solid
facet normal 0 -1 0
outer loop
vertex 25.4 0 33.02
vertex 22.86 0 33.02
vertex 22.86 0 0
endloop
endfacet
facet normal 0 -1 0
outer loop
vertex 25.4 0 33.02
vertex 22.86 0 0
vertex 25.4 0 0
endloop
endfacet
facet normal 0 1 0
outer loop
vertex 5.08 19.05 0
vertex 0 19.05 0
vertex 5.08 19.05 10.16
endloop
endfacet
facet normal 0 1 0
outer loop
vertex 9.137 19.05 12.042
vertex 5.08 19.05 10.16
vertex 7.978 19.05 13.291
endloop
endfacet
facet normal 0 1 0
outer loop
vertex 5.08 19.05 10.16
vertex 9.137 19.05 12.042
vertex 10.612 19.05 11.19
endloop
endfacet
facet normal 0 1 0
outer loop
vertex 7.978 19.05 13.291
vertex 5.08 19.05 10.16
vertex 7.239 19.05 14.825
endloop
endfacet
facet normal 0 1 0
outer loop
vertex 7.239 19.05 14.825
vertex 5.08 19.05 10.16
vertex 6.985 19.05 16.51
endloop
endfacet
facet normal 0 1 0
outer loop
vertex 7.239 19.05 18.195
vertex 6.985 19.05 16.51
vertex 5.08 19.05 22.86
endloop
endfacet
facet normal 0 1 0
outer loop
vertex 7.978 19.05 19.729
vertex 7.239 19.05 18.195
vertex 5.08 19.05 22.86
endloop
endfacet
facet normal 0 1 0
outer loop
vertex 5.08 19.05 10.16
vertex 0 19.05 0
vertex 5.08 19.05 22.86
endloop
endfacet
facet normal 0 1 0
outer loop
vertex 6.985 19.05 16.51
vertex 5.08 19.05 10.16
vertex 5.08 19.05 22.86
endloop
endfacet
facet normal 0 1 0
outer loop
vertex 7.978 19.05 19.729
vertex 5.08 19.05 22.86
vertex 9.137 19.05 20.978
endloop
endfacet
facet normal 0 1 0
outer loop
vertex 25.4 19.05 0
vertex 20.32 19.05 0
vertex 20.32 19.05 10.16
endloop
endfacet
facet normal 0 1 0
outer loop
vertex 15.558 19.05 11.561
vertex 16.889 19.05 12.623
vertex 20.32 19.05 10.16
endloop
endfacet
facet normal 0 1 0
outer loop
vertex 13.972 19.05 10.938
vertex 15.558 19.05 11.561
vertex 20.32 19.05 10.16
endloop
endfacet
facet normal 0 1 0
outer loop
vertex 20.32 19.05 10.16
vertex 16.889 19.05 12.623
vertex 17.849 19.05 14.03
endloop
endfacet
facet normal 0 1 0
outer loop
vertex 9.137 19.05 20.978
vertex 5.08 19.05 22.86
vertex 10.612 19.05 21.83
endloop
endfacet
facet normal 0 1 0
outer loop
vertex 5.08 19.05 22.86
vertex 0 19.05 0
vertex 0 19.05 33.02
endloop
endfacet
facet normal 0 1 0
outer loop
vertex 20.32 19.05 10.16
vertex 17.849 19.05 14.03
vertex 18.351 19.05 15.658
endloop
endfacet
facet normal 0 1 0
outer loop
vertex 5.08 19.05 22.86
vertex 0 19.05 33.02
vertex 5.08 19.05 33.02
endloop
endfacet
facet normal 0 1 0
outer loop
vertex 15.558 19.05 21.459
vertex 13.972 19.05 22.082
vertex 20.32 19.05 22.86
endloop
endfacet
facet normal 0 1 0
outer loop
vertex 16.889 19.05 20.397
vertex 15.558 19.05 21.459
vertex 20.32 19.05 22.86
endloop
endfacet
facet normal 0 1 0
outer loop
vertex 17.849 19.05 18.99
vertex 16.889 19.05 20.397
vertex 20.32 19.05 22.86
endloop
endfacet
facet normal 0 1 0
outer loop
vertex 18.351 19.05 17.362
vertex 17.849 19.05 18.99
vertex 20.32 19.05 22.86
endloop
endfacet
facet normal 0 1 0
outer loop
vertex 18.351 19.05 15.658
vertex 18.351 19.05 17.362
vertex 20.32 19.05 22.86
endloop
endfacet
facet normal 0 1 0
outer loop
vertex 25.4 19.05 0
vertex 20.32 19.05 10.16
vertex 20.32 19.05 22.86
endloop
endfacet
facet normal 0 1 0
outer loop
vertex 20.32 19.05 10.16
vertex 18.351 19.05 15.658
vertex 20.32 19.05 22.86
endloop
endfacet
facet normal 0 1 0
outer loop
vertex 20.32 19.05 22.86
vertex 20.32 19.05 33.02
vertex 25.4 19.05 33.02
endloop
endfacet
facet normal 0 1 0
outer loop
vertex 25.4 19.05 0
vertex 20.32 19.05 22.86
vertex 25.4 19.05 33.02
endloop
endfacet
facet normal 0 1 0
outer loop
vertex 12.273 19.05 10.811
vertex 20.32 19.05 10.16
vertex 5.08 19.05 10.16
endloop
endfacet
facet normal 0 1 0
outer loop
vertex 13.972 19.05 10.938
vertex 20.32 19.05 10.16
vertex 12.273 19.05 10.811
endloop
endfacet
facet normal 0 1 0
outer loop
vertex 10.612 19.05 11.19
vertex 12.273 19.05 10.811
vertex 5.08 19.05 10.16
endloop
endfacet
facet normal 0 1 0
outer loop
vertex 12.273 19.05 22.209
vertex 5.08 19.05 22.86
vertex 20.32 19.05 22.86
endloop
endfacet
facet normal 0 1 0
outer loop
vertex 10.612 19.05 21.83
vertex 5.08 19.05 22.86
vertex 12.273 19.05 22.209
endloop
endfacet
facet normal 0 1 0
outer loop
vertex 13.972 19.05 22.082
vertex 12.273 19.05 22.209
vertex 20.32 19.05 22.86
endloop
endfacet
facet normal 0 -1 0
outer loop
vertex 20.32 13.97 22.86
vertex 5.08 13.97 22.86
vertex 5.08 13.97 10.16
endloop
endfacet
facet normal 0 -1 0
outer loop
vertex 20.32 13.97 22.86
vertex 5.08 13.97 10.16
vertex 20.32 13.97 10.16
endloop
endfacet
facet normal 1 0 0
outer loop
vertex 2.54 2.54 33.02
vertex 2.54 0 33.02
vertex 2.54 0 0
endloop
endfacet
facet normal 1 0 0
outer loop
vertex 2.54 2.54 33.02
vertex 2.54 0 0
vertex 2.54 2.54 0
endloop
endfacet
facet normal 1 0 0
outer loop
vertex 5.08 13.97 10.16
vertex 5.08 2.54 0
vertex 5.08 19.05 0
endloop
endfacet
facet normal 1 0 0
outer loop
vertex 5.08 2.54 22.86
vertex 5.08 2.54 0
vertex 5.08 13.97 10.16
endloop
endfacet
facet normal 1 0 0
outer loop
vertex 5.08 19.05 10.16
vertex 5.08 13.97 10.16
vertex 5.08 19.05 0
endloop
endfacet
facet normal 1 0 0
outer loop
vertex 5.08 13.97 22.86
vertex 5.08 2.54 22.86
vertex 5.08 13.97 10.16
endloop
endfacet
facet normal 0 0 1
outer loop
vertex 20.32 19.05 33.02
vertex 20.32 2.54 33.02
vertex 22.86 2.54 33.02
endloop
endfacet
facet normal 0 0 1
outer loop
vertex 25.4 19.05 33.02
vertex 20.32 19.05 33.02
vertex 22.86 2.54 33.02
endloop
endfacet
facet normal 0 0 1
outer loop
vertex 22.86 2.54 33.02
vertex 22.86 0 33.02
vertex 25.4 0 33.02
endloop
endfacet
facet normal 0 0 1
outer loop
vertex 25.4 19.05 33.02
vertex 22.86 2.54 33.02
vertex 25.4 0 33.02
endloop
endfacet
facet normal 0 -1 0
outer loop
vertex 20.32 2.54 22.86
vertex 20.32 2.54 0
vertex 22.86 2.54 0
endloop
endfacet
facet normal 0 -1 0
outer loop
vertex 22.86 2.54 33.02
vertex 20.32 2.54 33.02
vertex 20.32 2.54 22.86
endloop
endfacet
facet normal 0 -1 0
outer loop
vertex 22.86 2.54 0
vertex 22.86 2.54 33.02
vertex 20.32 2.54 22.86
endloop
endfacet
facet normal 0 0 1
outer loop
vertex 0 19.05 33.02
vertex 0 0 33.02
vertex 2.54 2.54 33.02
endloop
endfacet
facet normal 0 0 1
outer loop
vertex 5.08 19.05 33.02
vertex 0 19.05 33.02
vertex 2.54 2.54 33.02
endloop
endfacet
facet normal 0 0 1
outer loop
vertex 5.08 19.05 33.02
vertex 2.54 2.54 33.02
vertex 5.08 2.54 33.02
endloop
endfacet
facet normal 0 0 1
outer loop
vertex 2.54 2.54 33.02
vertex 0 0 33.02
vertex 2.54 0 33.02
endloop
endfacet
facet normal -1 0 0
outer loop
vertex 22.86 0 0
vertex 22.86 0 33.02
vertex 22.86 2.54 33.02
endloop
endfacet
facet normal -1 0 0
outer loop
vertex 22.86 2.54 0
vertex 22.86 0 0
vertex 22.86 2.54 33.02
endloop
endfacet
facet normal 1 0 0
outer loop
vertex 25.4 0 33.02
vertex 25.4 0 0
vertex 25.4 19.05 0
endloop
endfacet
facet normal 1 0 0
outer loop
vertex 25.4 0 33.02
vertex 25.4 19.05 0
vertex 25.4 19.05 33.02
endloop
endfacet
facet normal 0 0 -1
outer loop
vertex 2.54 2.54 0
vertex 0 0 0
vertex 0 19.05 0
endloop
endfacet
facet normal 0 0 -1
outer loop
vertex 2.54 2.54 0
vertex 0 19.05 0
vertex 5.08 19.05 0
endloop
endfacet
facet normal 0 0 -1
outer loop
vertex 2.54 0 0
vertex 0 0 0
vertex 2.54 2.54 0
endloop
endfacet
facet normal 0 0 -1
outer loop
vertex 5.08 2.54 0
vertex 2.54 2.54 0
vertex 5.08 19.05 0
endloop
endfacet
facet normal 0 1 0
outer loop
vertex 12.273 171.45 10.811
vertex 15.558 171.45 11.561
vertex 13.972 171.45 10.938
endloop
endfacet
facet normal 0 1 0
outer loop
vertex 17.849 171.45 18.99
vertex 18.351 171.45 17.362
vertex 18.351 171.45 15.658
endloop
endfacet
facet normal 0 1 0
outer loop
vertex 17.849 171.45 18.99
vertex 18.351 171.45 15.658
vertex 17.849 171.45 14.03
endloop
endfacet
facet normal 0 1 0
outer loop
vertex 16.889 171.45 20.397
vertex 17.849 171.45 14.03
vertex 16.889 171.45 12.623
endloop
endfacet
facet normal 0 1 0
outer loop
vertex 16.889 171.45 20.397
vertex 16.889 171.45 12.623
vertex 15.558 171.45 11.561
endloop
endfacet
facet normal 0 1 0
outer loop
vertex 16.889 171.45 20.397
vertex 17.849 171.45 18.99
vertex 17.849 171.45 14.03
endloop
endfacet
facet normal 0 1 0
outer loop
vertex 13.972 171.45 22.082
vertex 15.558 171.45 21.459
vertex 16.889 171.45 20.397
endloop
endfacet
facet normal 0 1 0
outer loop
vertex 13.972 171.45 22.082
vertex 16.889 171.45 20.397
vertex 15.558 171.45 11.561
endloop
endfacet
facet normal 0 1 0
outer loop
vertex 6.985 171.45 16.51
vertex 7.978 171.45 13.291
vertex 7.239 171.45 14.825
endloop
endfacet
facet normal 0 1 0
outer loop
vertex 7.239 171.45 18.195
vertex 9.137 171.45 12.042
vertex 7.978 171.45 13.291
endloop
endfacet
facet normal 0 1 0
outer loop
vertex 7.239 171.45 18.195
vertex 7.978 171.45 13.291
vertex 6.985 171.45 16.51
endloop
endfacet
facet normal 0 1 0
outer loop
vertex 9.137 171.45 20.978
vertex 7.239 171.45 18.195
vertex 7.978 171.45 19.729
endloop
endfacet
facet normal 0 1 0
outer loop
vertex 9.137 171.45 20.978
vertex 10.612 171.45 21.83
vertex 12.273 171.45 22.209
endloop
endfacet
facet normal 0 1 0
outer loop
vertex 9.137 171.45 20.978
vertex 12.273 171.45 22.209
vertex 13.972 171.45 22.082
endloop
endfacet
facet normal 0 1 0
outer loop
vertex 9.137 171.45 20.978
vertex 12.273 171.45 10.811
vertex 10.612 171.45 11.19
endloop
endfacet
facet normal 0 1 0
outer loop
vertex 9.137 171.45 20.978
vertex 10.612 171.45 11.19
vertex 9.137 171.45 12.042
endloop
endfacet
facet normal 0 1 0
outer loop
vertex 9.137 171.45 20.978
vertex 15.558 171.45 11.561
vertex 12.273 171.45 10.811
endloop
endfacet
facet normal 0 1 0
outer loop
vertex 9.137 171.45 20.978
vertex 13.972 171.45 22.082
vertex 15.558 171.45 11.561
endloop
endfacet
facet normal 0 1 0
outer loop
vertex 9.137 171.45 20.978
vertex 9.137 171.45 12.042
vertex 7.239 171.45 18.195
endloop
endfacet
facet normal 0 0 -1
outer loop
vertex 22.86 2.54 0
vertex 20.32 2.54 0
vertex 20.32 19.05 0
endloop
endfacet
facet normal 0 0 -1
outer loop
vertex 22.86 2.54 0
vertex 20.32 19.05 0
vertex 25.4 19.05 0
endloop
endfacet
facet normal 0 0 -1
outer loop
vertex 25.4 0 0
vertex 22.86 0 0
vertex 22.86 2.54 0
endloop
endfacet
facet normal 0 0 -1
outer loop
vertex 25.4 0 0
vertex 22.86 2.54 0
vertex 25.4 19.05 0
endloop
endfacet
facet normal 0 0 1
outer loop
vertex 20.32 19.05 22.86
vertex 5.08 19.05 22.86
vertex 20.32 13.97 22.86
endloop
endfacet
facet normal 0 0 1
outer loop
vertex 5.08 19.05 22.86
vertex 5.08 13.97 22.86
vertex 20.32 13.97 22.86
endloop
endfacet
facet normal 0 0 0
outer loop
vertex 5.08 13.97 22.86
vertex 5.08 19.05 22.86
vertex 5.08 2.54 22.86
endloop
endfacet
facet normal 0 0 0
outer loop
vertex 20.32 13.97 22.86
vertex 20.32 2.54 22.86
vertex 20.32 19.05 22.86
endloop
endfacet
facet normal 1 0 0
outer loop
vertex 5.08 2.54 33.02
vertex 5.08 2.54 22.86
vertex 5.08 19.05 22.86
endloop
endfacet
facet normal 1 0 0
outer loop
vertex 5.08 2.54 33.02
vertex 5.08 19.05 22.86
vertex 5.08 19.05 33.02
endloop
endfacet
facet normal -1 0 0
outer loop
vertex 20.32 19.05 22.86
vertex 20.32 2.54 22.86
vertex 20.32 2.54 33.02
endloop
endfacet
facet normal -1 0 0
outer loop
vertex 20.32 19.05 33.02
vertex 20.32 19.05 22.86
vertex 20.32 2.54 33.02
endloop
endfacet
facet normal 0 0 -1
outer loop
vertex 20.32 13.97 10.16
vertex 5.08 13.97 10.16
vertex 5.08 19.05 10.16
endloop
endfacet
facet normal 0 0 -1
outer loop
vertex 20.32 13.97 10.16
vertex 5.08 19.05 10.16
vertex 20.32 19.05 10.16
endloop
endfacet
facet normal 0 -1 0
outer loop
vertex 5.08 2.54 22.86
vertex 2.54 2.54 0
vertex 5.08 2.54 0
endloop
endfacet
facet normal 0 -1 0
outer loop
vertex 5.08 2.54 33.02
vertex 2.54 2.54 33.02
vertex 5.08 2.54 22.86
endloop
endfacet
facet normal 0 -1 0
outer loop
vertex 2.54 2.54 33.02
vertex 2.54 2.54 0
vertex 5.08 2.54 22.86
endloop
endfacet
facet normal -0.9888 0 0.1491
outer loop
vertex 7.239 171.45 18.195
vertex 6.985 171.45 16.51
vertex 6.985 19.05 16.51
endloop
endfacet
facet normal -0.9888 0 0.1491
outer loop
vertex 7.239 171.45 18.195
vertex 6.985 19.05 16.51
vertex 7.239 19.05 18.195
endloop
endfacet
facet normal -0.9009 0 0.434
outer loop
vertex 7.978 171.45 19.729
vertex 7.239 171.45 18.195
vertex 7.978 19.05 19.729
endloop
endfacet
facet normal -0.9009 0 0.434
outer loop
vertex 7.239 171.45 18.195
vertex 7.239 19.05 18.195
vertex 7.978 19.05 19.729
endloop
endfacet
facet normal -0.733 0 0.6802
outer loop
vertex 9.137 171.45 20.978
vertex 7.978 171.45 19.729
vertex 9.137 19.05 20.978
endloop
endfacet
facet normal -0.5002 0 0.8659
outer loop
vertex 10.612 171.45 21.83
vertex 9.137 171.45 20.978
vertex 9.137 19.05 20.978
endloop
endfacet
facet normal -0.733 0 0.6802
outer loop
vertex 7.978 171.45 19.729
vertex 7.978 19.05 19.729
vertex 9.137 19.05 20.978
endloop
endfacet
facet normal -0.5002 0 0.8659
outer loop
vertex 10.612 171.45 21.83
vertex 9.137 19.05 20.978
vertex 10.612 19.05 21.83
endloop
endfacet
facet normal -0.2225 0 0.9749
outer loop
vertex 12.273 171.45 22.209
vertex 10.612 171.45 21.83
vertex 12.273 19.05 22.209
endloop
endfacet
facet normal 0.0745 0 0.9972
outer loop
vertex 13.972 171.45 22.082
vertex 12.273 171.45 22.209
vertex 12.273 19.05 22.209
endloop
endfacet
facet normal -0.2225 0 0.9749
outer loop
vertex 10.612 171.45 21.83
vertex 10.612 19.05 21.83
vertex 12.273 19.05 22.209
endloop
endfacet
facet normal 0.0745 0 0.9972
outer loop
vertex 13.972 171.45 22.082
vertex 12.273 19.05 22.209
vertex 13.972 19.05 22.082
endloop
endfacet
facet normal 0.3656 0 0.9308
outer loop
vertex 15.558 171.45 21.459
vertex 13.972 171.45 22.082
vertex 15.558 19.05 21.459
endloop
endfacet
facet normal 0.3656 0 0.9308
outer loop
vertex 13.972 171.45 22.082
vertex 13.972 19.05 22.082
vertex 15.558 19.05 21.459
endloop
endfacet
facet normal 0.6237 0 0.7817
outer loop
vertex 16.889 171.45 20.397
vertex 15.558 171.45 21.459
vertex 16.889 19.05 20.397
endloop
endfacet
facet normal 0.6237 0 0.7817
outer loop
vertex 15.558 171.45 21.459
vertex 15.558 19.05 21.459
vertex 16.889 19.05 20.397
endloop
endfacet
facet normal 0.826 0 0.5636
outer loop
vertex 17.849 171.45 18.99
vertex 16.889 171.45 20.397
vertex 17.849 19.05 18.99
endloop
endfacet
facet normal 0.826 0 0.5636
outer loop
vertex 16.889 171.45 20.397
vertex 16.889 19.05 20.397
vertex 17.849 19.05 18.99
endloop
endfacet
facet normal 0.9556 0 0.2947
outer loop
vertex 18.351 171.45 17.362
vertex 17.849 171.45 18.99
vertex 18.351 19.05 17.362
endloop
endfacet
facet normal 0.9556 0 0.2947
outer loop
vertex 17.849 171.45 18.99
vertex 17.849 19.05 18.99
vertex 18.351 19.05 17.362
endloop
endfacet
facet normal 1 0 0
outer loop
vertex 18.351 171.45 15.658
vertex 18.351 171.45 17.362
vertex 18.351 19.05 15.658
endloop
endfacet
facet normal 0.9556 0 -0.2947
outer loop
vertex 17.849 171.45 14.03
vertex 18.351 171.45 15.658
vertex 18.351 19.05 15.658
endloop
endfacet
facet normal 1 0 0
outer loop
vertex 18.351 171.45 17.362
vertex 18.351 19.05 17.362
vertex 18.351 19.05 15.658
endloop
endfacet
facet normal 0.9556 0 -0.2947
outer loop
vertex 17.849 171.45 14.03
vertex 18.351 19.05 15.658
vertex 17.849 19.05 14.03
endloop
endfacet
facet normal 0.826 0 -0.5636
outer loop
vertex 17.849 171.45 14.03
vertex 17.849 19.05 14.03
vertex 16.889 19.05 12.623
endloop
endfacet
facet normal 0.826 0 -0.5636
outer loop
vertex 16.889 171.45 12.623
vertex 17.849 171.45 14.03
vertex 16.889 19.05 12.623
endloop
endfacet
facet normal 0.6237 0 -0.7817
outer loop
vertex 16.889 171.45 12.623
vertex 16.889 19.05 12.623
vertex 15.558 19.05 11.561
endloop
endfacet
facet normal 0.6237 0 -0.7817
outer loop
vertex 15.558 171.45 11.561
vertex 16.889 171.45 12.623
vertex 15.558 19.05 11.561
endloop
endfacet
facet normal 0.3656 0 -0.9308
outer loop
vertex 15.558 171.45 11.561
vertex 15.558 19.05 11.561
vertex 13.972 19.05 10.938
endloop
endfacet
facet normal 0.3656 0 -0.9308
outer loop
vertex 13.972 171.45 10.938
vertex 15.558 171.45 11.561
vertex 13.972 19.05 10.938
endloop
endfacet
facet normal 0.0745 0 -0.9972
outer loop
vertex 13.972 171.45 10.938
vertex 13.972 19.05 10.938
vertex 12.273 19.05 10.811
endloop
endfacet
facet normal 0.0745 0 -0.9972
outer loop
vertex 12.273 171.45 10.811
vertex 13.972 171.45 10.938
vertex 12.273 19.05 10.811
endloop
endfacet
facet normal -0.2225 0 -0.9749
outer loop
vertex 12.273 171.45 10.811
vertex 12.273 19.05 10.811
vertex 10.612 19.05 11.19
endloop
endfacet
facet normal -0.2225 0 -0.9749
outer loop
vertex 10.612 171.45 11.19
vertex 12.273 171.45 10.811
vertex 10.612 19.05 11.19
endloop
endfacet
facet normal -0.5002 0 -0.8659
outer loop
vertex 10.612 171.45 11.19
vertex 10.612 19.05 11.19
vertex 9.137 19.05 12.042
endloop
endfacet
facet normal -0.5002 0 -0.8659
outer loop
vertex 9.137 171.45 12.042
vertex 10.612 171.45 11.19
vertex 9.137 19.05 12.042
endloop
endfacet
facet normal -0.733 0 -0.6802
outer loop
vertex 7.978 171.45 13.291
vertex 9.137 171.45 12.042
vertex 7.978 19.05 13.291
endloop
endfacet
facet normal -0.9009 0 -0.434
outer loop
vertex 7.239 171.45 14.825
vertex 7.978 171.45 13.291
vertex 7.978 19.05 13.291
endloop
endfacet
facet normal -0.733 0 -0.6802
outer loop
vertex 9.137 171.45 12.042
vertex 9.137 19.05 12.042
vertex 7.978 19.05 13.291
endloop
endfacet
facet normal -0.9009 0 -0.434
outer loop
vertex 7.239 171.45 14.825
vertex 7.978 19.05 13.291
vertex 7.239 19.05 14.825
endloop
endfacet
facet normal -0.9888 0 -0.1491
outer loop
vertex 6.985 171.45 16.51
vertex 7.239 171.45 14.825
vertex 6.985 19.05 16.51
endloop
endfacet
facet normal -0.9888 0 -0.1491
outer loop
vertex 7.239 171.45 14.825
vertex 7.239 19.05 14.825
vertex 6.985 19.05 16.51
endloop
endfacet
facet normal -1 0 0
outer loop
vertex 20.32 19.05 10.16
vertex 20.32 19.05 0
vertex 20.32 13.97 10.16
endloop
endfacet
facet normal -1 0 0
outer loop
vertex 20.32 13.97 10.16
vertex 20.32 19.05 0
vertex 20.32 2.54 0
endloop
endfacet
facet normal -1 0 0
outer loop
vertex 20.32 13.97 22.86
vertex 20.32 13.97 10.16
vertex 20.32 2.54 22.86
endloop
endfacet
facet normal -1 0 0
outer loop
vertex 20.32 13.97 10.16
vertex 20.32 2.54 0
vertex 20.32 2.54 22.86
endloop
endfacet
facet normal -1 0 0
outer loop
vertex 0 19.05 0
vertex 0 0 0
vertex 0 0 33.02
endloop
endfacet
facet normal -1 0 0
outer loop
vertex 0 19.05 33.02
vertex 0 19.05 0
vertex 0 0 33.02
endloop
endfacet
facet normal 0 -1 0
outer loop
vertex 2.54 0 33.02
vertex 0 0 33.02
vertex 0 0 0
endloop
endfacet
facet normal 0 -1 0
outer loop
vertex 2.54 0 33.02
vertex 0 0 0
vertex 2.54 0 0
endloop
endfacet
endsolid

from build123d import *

# Parameters (mm, degrees)
F0_W      = 25.4
F0_H      = 33.02
F2_DEPTH  = 19.05
F3_W      = 15.24
F3_H      = 13.97
F4_DEPTH  = 33.021
F5_W      = 2.54
F5_H      = 2.54
F6_DEPTH  = 33.021
F8_W      = 15.240135
F8_H      = 10.197046
F8_W_2    = 15.24
F8_H_2    = 10.16
F9_DEPTH  = 19.051
F11_R     = 5.715
F12_DEPTH = 152.4


with BuildPart() as f2:
    # F0 (on Front) → F2 (new body)
    with BuildSketch(Plane.XZ):
        with Locations((12.7, 16.51)):
            Rectangle(F0_W, F0_H)
    extrude(amount=-F2_DEPTH)

    # F3 (on face) → F4 (cut, through all)
    with BuildSketch(Plane.XY.offset(33.02)):
        with Locations((12.7, 6.985)):
            Rectangle(F3_W, F3_H)
    extrude(amount=-F4_DEPTH, mode=Mode.SUBTRACT)

    # F5 (on face) → F6 (cut, through all)
    with BuildSketch(Plane.XY.offset(33.02)):
        with Locations((3.81, 1.27)):
            Rectangle(F5_W, F5_H)
        with Locations((21.59, 1.27)):
            Rectangle(F5_W, F5_H)
    extrude(amount=-F6_DEPTH, mode=Mode.SUBTRACT)

    # F8 (on face) → F9 (cut, through all)
    with BuildSketch(Plane.XZ):
        with Locations((12.700067, 27.958523)):
            Rectangle(F8_W, F8_H)
        with Locations((12.7, 5.08)):
            Rectangle(F8_W_2, F8_H_2)
    extrude(amount=-F9_DEPTH, mode=Mode.SUBTRACT)

    # F11 (on face) → F12 (join)
    with BuildSketch(Plane(origin=(0, 19.05, 0), x_dir=(-1, 0, 0), z_dir=(0, 1, 0))):
        with Locations((-12.7, 16.51)):
            Circle(F11_R)
    extrude(amount=F12_DEPTH)


solid = f2.part
